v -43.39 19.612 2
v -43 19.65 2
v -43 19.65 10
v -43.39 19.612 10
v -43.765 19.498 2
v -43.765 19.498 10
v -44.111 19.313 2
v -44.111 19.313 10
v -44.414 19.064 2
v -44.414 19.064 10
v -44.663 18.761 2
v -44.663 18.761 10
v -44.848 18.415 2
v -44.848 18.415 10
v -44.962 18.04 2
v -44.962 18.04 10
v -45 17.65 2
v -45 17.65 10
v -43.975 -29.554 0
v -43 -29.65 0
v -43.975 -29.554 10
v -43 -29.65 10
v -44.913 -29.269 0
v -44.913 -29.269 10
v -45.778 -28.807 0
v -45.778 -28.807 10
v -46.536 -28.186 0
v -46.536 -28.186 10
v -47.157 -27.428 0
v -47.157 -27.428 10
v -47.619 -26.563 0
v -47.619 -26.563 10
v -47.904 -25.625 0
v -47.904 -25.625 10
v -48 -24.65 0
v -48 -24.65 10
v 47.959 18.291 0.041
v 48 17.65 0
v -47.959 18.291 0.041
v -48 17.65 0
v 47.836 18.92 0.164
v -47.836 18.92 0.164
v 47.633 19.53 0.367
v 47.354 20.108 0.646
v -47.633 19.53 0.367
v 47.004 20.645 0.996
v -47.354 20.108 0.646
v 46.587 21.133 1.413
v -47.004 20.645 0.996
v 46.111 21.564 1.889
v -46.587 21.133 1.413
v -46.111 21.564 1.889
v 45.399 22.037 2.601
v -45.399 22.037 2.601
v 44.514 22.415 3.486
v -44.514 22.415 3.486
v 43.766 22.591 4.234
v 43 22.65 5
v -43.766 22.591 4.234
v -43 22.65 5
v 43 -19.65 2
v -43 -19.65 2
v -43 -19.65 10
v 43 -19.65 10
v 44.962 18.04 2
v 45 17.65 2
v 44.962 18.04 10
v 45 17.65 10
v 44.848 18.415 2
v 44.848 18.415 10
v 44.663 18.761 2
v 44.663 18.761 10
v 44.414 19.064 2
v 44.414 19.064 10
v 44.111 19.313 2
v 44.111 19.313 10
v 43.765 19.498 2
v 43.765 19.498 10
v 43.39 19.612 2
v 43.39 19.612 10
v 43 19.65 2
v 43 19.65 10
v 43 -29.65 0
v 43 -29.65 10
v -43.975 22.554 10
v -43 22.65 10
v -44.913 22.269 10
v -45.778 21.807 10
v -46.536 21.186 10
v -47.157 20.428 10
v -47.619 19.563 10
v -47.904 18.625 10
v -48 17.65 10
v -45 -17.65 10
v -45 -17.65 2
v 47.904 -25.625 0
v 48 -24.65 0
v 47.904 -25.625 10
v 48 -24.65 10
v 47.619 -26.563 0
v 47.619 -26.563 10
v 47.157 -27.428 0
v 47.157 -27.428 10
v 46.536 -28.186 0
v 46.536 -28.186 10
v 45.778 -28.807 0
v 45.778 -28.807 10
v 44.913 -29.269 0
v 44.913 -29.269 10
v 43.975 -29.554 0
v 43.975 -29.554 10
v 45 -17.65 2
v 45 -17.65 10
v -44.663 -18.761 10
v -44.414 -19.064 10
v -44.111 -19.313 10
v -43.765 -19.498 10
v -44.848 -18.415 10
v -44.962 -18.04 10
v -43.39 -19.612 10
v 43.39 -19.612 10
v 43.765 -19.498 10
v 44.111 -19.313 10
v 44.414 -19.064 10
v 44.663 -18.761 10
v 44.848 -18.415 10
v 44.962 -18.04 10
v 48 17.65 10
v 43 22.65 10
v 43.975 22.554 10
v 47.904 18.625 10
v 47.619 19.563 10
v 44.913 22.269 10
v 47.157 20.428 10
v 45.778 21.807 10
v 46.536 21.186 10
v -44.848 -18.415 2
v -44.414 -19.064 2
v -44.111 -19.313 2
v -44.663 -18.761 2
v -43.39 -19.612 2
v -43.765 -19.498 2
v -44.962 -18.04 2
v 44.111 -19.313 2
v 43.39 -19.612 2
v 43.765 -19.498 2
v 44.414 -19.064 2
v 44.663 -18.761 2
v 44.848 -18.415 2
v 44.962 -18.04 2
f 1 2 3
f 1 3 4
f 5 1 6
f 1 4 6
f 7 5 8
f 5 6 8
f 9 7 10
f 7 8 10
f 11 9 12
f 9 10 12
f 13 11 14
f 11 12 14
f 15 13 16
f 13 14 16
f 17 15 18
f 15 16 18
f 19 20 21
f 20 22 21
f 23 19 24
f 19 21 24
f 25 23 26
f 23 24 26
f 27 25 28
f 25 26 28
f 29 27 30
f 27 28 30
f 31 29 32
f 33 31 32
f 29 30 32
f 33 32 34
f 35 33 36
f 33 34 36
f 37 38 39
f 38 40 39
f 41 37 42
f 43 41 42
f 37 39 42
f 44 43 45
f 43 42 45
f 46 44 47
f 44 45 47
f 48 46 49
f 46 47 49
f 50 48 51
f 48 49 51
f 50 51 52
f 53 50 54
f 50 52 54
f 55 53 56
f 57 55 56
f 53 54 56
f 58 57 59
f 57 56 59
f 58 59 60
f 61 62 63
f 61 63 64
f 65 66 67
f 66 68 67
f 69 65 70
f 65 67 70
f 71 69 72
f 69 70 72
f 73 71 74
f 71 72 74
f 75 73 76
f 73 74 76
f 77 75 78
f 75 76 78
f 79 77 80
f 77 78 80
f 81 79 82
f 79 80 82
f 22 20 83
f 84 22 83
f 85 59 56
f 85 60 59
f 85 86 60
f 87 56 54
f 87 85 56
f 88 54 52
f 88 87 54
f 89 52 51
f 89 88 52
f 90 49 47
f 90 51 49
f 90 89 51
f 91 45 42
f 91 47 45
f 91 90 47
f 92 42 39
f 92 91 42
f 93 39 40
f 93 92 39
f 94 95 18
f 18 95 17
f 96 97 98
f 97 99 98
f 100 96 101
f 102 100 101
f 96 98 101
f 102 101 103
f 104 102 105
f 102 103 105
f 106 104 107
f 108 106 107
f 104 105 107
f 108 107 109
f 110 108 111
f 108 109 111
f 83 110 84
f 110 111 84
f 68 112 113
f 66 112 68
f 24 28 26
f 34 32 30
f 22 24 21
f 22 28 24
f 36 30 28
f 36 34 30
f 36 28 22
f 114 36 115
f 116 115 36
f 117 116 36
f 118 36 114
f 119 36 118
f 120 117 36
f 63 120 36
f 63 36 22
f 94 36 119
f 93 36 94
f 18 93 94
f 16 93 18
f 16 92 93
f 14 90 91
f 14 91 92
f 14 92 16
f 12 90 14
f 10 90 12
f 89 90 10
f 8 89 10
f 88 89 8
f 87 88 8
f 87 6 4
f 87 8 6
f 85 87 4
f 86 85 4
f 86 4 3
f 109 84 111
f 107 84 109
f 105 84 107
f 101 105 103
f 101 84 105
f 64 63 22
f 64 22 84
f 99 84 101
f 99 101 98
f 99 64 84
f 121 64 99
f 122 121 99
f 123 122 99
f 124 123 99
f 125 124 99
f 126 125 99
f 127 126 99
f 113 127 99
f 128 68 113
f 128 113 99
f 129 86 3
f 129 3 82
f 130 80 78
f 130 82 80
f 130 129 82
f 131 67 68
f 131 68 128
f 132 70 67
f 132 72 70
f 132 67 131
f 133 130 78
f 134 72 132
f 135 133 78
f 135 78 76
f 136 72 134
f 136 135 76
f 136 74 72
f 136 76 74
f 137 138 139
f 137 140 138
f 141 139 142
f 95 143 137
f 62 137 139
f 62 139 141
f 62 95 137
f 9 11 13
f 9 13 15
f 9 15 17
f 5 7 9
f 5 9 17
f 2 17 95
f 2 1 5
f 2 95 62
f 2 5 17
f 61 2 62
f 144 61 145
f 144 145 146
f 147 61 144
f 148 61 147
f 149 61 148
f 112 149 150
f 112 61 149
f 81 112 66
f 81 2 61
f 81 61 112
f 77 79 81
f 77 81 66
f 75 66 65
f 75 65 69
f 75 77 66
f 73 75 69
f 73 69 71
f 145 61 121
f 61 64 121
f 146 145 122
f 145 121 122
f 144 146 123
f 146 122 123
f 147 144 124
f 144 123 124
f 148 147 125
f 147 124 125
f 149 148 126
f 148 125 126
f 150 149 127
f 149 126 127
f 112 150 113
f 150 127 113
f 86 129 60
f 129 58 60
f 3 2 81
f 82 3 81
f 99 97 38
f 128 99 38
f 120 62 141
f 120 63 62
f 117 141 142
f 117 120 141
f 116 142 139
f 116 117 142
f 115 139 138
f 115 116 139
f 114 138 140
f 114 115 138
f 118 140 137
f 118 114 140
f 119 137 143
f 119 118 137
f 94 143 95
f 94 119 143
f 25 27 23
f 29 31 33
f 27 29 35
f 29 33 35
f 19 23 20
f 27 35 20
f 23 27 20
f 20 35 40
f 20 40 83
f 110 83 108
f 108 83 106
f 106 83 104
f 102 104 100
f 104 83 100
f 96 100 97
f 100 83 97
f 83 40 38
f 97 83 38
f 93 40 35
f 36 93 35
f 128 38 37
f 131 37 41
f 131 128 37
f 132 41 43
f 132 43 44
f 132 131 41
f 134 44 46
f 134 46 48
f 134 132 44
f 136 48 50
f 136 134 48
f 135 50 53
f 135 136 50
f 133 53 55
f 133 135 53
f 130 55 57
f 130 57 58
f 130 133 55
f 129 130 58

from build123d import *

# Parameters (mm, degrees)
F0_W     = 90
F0_H     = 39.3
F1_DEPTH = 10
F2_DEPTH = 2
F3_R     = 5
F4_R     = 2


with BuildPart() as f1:
    # F0 (on Top) → F1 (new body)
    with BuildSketch(Plane.XY):
        Polygon((-45, -29.65), (45, -29.65), (48, -29.65), (48, 19.65), (48, 22.65), (-48, 22.65), (-48, 19.65), (-48, -29.65), align=None)
        Rectangle(F0_W, F0_H, mode=Mode.SUBTRACT)
    extrude(amount=F1_DEPTH)

    # F0 (on Top) → F2 (join)
    with BuildSketch(Plane.XY):
        Rectangle(F0_W, F0_H)
    extrude(amount=F2_DEPTH)

    # F3
    f3_edges = [f1.edges().sort_by_distance(p)[0] for p in [
        (0, 22.65, 0),
        (-48, 22.65, 5),
        (48, 22.65, 5),
        (-48, -29.65, 5),
        (48, -29.65, 5),
    ]]
    fillet(f3_edges, radius=F3_R)

    # F4
    f4_edges = [f1.edges().sort_by_distance(p)[0] for p in [
        (-45, 19.65, 6),
        (45, 19.65, 6),
        (45, -19.65, 6),
        (-45, -19.65, 6),
    ]]
    fillet(f4_edges, radius=F4_R)


solid = f1.part
